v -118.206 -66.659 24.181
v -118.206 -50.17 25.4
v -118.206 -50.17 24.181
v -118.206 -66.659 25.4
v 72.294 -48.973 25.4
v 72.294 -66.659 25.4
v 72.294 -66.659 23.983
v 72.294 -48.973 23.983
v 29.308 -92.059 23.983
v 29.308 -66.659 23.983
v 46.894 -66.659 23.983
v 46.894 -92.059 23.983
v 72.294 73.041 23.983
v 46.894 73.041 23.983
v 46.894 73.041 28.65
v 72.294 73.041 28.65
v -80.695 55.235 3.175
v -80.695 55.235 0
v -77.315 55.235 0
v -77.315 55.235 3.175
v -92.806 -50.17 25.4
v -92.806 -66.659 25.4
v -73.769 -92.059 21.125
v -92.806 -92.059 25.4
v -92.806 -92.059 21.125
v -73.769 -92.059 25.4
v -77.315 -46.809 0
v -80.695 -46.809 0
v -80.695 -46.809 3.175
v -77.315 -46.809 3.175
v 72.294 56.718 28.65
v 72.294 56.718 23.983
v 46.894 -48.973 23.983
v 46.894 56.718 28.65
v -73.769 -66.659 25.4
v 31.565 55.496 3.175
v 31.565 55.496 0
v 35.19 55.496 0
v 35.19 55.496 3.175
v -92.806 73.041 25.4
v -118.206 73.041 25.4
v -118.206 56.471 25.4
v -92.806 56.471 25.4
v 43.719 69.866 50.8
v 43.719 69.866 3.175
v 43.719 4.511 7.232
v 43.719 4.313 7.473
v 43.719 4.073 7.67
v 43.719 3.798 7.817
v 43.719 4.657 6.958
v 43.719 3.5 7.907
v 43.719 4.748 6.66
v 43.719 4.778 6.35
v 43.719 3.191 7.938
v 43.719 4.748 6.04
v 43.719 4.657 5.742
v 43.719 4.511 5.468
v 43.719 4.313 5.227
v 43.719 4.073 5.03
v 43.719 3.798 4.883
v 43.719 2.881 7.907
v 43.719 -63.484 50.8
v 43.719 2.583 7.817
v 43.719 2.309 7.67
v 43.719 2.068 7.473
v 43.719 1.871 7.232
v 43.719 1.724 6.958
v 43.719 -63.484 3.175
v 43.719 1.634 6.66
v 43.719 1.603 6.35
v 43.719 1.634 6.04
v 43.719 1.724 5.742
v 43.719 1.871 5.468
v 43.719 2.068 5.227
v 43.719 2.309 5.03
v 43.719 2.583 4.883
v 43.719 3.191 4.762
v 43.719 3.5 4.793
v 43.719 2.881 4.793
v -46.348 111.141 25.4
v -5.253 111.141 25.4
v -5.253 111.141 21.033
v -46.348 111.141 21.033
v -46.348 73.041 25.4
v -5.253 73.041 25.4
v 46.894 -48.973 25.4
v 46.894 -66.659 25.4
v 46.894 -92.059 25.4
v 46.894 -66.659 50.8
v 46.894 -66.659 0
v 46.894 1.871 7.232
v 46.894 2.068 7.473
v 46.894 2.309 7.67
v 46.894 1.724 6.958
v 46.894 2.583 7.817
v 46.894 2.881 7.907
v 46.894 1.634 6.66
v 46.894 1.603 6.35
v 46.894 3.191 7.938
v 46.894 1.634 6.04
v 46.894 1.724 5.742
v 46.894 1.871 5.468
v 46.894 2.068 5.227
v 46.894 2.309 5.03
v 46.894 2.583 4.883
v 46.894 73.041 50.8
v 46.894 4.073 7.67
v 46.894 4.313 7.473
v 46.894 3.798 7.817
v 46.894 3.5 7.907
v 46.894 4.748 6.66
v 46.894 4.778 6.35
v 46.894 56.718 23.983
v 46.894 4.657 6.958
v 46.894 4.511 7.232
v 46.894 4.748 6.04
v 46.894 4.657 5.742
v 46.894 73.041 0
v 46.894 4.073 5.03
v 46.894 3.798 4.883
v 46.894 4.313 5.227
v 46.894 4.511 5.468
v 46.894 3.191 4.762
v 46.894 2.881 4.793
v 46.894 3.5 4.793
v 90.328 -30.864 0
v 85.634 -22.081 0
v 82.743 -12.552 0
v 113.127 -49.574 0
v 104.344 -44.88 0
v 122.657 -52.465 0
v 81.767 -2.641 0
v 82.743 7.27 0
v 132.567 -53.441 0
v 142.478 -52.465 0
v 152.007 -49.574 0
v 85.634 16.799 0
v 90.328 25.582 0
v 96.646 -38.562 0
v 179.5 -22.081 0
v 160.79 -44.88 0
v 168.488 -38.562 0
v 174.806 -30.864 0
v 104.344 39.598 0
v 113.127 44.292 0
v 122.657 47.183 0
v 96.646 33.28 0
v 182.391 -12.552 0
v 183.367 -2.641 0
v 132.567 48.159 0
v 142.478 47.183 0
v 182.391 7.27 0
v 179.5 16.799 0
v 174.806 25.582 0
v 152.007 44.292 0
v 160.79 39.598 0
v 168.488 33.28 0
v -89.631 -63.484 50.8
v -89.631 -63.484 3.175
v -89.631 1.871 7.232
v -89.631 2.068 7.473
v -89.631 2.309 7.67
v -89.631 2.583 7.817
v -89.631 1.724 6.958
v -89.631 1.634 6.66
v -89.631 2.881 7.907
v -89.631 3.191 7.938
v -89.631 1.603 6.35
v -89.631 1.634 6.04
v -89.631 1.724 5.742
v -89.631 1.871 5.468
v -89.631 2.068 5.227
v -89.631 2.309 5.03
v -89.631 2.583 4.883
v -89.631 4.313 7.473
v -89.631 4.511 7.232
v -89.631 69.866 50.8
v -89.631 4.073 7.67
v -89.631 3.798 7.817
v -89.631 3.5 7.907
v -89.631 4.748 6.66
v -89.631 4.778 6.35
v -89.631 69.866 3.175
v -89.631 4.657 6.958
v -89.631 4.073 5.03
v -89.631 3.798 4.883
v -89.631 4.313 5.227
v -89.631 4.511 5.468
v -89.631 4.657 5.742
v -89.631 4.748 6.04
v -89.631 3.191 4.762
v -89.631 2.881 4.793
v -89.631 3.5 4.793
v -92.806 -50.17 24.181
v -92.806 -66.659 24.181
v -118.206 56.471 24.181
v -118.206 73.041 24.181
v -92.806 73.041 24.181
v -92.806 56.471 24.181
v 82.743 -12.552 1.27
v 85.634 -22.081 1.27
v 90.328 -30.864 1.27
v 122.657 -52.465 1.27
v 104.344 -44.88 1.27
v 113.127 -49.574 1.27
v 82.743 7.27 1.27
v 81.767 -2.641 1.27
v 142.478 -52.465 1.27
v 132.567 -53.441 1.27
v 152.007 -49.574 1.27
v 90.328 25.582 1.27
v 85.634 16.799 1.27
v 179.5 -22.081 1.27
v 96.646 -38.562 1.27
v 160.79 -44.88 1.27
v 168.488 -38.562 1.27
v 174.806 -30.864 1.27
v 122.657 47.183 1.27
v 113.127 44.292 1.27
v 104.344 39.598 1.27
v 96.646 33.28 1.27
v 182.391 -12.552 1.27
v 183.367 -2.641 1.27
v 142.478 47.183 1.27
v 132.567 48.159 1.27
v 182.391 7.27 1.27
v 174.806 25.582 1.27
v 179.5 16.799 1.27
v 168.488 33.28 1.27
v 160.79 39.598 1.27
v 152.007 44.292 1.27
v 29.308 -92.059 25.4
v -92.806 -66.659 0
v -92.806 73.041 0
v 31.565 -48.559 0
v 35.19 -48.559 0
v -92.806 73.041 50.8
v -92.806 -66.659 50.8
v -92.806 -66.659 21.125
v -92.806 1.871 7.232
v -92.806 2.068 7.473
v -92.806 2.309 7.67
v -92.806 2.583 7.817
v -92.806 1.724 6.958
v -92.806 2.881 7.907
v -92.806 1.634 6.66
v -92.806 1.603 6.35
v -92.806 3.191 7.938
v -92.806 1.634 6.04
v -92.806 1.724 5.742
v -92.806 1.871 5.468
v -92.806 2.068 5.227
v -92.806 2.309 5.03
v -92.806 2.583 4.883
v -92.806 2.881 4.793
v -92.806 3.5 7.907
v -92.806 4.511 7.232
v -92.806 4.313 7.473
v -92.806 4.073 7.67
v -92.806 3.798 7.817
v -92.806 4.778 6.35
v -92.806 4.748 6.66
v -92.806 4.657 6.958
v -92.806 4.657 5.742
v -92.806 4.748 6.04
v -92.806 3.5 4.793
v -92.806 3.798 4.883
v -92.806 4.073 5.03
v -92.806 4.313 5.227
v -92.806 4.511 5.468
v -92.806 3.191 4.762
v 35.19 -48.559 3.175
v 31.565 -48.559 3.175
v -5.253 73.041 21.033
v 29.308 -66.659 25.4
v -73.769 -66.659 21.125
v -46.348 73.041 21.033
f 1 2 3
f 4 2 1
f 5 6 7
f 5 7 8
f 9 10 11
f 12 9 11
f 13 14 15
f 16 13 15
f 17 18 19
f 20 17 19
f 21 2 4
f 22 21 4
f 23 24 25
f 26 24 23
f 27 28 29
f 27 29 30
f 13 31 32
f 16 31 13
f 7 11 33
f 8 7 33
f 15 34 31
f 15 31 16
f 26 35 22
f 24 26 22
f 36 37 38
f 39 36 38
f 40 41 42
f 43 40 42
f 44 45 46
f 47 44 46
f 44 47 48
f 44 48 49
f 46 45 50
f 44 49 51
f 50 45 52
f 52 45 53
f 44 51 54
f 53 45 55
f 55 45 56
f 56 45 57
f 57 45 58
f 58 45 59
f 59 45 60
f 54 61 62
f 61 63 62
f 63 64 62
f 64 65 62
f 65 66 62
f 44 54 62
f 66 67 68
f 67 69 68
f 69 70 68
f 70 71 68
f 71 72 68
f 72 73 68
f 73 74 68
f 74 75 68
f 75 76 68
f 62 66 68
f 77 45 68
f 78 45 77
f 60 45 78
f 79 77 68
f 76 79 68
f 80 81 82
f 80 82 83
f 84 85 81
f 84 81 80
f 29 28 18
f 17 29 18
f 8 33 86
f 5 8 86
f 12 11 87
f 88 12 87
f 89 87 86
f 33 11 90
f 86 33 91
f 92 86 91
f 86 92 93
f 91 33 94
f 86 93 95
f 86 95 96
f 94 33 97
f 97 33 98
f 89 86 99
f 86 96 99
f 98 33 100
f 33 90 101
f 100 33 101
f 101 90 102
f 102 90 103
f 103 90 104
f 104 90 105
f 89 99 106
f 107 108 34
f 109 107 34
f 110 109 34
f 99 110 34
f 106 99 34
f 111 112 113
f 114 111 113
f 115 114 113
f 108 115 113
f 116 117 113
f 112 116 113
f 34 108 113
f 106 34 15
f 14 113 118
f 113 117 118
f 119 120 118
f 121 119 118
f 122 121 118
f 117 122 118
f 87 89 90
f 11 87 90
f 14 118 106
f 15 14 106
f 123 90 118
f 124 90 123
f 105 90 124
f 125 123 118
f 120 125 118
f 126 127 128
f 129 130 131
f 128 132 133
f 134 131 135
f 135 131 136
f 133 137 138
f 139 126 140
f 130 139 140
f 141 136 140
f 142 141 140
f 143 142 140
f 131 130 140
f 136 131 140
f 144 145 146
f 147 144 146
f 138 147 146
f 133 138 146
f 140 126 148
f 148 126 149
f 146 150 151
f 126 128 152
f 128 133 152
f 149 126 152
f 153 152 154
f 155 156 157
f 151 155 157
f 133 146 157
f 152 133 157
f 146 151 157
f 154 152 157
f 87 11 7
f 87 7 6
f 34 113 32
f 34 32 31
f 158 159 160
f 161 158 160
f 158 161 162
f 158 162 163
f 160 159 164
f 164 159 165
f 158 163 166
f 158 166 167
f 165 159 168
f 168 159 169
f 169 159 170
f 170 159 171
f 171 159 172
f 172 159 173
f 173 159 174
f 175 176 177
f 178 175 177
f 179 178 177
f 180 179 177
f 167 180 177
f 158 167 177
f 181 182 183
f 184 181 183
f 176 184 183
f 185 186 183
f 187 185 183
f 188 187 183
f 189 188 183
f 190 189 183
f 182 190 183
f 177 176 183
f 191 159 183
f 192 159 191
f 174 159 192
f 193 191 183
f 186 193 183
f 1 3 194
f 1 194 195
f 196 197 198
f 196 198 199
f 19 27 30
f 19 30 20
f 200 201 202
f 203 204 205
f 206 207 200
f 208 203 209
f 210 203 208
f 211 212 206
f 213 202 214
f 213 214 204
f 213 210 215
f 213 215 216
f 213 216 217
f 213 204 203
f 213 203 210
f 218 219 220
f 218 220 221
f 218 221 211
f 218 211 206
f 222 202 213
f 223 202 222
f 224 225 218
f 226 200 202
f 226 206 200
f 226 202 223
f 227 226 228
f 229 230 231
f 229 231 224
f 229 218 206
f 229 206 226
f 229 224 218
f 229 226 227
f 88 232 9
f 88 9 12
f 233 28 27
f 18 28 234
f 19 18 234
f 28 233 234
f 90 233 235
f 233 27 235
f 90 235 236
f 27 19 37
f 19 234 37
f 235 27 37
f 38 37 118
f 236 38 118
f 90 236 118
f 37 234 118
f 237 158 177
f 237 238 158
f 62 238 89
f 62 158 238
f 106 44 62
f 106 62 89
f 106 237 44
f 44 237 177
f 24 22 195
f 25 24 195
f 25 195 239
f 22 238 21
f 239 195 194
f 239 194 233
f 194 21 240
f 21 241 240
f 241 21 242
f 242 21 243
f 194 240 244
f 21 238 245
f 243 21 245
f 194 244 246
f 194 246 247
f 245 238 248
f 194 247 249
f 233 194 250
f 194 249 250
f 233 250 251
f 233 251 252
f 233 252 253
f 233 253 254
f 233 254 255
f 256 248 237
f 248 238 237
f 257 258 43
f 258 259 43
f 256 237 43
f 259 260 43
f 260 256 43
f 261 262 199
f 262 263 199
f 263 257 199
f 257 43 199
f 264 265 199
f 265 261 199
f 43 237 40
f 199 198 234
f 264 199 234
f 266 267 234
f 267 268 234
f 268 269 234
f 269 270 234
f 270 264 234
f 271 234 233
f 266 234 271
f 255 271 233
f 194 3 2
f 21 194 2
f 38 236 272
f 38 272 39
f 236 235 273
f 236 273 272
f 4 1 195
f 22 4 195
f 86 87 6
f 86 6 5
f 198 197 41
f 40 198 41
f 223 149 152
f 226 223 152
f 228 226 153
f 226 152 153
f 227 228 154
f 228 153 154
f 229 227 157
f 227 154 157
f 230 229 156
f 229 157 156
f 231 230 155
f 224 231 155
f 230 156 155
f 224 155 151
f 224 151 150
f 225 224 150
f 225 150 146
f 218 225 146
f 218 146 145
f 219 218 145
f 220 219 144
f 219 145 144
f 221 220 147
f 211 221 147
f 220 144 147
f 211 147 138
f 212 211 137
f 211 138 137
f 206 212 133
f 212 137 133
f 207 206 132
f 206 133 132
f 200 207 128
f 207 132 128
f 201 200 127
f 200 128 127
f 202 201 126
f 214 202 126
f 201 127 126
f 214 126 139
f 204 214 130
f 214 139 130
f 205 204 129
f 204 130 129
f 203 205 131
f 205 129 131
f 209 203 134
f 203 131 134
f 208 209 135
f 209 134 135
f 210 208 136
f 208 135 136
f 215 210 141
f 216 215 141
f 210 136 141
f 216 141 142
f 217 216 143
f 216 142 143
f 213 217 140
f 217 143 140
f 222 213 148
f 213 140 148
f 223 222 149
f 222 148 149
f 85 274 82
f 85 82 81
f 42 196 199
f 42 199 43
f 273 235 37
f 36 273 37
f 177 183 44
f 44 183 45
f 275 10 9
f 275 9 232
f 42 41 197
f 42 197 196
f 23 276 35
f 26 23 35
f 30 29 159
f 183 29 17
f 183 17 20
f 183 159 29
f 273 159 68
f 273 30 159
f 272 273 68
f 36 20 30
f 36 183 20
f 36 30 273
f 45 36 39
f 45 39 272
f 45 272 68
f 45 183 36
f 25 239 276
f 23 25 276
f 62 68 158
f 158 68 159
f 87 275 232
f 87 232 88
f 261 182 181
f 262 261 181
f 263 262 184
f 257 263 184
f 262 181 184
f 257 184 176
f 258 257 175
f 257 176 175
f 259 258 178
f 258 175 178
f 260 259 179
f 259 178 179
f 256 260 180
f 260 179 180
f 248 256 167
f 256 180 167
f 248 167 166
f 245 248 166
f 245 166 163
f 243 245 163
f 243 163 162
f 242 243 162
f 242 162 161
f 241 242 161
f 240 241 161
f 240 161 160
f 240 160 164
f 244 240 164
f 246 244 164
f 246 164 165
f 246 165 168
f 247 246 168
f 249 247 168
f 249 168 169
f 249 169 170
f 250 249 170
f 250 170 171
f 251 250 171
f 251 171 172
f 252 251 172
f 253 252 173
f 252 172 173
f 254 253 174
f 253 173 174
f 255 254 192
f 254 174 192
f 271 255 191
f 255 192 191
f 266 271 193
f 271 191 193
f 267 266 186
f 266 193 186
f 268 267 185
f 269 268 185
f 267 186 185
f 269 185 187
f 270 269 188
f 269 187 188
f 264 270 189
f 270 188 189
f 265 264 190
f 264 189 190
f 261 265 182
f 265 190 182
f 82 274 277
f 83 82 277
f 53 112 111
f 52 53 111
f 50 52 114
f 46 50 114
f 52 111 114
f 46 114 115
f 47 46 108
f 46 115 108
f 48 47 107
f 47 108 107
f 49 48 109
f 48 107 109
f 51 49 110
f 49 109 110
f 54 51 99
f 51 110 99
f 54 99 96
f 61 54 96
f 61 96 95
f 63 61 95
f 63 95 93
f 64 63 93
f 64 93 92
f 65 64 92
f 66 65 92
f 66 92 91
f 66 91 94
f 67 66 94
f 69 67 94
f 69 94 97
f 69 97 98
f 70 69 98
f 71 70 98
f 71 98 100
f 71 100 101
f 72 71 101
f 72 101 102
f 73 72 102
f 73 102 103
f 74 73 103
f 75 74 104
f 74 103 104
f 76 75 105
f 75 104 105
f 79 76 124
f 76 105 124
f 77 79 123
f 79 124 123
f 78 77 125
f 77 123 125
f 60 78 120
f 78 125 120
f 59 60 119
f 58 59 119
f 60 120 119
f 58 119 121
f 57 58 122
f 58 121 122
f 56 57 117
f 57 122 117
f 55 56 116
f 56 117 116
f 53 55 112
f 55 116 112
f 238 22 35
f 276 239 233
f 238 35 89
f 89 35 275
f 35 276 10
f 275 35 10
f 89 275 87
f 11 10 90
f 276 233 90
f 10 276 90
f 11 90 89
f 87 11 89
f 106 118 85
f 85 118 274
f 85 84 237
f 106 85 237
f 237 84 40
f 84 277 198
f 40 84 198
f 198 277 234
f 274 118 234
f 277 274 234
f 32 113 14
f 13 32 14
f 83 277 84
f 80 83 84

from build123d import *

# Parameters (mm, degrees)
F0_W      = 133.35
F0_H      = 133.35
F0_W_2    = 3.175
F0_H_2    = 3.175
F1_DEPTH  = 3.175
F2_DEPTH  = 50.8
F3_W      = 41.094694
F3_H      = 4.367494
F4_DEPTH  = 38.1
F5_W      = 16.569869
F5_H      = 1.219057
F5_W_2    = 16.489192
F6_DEPTH  = 25.4
F7_W      = 17.686799
F7_H      = 1.416972
F7_W_2    = 16.322573
F7_H_2    = 4.66725
F8_DEPTH  = 25.4
F9_W      = 17.585407
F9_H      = 1.416972
F10_DEPTH = 25.4
F12_D     = 3.175
F13_W     = 3.380321
F13_H     = 102.044156
F13_W_2   = 3.625512
F13_H_2   = 104.0543
F14_DEPTH = 25.4
F15_R     = 50.8
F16_DEPTH = 1.27


with BuildPart() as f1:
    # F0 (on Top) → F1 (new body)
    with BuildSketch(Plane.XY):
        with Locations((-22.956216, 3.19055)):
            Rectangle(F0_W, F0_H)
        with Locations((-91.218716, 71.45305)):
            Rectangle(F0_W_2, F0_H_2)
        Polygon((46.893784, 73.04055), (-89.631216, 73.04055), (-89.631216, 69.86555), (43.718784, 69.86555), (43.718784, -63.48445), (46.893784, -63.48445), align=None)
        Polygon((-89.631216, 69.86555), (-92.806216, 69.86555), (-92.806216, -66.65945), (43.718784, -66.65945), (43.718784, -63.48445), (-89.631216, -63.48445), align=None)
        with Locations((45.306284, -65.07195)):
            Rectangle(F0_W_2, F0_H_2)
    extrude(amount=F1_DEPTH)

    # F0 (on Top) → F2 (join)
    with BuildSketch(Plane.XY):
        with Locations((-91.218716, 71.45305)):
            Rectangle(F0_W_2, F0_H_2)
        Polygon((46.893784, 73.04055), (-89.631216, 73.04055), (-89.631216, 69.86555), (43.718784, 69.86555), (43.718784, -63.48445), (46.893784, -63.48445), align=None)
        Polygon((-89.631216, 69.86555), (-92.806216, 69.86555), (-92.806216, -66.65945), (43.718784, -66.65945), (43.718784, -63.48445), (-89.631216, -63.48445), align=None)
        with Locations((45.306284, -65.07195)):
            Rectangle(F0_W_2, F0_H_2)
    extrude(amount=F2_DEPTH)

    # F3 (on face) → F4 (join)
    with BuildSketch(Plane(origin=(0, 73.04055, 0), x_dir=(-1, 0, 0), z_dir=(0, 1, 0))):
        with Locations((25.800167, 23.216253)):
            Rectangle(F3_W, F3_H)
    extrude(amount=F4_DEPTH)

    # F5 (on face) → F6 (join)
    with BuildSketch(Plane(origin=(-92.806216, 0, 0), x_dir=(0, -1, 0), z_dir=(-1, 0, 0))):
        with Locations((-64.755616, 24.790471)):
            Rectangle(F5_W, F5_H)
        with Locations((58.414854, 24.790471)):
            Rectangle(F5_W_2, F5_H)
    extrude(amount=F6_DEPTH)

    # F7 (on face) → F8 (join)
    with BuildSketch(Plane.YZ.offset(46.893784)):
        with Locations((-57.81605, 24.691514)):
            Rectangle(F7_W, F7_H)
        with Locations((64.879263, 26.316653)):
            Rectangle(F7_W_2, F7_H_2)
    extrude(amount=F8_DEPTH)

    # F9 (on face) → F10 (join)
    with BuildSketch(Plane.XZ.offset(66.65945)):
        Polygon((-73.769018, 25.4), (-92.806216, 25.4), (-92.806216, 24.180943), (-92.806216, 21.125272), (-73.769018, 21.125272), align=None)
        with Locations((38.10108, 24.691514)):
            Rectangle(F9_W, F9_H)
    extrude(amount=F10_DEPTH)

    # F12 (through all)
    with Locations(Plane(origin=(-92.806216, 0, 0), x_dir=(0, -1, 0), z_dir=(-1, 0, 0))):
        with Locations((-3.19055, 6.35)):
            Hole(F12_D / 2)

    # F13 (on face) → F14 (cut)
    with BuildSketch(Plane.XY):
        with Locations((-79.005237, 4.21339)):
            Rectangle(F13_W, F13_H)
        with Locations((33.377264, 3.468466)):
            Rectangle(F13_W_2, F13_H_2)
    extrude(amount=F14_DEPTH, mode=Mode.SUBTRACT)


with BuildPart() as f16:
    # F15 (on Top) → F16 (new body)
    with BuildSketch(Plane.XY):
        with Locations((132.567152, -2.641031)):
            Circle(F15_R)
    extrude(amount=F16_DEPTH)


solid = Compound([f1.part, f16.part])
